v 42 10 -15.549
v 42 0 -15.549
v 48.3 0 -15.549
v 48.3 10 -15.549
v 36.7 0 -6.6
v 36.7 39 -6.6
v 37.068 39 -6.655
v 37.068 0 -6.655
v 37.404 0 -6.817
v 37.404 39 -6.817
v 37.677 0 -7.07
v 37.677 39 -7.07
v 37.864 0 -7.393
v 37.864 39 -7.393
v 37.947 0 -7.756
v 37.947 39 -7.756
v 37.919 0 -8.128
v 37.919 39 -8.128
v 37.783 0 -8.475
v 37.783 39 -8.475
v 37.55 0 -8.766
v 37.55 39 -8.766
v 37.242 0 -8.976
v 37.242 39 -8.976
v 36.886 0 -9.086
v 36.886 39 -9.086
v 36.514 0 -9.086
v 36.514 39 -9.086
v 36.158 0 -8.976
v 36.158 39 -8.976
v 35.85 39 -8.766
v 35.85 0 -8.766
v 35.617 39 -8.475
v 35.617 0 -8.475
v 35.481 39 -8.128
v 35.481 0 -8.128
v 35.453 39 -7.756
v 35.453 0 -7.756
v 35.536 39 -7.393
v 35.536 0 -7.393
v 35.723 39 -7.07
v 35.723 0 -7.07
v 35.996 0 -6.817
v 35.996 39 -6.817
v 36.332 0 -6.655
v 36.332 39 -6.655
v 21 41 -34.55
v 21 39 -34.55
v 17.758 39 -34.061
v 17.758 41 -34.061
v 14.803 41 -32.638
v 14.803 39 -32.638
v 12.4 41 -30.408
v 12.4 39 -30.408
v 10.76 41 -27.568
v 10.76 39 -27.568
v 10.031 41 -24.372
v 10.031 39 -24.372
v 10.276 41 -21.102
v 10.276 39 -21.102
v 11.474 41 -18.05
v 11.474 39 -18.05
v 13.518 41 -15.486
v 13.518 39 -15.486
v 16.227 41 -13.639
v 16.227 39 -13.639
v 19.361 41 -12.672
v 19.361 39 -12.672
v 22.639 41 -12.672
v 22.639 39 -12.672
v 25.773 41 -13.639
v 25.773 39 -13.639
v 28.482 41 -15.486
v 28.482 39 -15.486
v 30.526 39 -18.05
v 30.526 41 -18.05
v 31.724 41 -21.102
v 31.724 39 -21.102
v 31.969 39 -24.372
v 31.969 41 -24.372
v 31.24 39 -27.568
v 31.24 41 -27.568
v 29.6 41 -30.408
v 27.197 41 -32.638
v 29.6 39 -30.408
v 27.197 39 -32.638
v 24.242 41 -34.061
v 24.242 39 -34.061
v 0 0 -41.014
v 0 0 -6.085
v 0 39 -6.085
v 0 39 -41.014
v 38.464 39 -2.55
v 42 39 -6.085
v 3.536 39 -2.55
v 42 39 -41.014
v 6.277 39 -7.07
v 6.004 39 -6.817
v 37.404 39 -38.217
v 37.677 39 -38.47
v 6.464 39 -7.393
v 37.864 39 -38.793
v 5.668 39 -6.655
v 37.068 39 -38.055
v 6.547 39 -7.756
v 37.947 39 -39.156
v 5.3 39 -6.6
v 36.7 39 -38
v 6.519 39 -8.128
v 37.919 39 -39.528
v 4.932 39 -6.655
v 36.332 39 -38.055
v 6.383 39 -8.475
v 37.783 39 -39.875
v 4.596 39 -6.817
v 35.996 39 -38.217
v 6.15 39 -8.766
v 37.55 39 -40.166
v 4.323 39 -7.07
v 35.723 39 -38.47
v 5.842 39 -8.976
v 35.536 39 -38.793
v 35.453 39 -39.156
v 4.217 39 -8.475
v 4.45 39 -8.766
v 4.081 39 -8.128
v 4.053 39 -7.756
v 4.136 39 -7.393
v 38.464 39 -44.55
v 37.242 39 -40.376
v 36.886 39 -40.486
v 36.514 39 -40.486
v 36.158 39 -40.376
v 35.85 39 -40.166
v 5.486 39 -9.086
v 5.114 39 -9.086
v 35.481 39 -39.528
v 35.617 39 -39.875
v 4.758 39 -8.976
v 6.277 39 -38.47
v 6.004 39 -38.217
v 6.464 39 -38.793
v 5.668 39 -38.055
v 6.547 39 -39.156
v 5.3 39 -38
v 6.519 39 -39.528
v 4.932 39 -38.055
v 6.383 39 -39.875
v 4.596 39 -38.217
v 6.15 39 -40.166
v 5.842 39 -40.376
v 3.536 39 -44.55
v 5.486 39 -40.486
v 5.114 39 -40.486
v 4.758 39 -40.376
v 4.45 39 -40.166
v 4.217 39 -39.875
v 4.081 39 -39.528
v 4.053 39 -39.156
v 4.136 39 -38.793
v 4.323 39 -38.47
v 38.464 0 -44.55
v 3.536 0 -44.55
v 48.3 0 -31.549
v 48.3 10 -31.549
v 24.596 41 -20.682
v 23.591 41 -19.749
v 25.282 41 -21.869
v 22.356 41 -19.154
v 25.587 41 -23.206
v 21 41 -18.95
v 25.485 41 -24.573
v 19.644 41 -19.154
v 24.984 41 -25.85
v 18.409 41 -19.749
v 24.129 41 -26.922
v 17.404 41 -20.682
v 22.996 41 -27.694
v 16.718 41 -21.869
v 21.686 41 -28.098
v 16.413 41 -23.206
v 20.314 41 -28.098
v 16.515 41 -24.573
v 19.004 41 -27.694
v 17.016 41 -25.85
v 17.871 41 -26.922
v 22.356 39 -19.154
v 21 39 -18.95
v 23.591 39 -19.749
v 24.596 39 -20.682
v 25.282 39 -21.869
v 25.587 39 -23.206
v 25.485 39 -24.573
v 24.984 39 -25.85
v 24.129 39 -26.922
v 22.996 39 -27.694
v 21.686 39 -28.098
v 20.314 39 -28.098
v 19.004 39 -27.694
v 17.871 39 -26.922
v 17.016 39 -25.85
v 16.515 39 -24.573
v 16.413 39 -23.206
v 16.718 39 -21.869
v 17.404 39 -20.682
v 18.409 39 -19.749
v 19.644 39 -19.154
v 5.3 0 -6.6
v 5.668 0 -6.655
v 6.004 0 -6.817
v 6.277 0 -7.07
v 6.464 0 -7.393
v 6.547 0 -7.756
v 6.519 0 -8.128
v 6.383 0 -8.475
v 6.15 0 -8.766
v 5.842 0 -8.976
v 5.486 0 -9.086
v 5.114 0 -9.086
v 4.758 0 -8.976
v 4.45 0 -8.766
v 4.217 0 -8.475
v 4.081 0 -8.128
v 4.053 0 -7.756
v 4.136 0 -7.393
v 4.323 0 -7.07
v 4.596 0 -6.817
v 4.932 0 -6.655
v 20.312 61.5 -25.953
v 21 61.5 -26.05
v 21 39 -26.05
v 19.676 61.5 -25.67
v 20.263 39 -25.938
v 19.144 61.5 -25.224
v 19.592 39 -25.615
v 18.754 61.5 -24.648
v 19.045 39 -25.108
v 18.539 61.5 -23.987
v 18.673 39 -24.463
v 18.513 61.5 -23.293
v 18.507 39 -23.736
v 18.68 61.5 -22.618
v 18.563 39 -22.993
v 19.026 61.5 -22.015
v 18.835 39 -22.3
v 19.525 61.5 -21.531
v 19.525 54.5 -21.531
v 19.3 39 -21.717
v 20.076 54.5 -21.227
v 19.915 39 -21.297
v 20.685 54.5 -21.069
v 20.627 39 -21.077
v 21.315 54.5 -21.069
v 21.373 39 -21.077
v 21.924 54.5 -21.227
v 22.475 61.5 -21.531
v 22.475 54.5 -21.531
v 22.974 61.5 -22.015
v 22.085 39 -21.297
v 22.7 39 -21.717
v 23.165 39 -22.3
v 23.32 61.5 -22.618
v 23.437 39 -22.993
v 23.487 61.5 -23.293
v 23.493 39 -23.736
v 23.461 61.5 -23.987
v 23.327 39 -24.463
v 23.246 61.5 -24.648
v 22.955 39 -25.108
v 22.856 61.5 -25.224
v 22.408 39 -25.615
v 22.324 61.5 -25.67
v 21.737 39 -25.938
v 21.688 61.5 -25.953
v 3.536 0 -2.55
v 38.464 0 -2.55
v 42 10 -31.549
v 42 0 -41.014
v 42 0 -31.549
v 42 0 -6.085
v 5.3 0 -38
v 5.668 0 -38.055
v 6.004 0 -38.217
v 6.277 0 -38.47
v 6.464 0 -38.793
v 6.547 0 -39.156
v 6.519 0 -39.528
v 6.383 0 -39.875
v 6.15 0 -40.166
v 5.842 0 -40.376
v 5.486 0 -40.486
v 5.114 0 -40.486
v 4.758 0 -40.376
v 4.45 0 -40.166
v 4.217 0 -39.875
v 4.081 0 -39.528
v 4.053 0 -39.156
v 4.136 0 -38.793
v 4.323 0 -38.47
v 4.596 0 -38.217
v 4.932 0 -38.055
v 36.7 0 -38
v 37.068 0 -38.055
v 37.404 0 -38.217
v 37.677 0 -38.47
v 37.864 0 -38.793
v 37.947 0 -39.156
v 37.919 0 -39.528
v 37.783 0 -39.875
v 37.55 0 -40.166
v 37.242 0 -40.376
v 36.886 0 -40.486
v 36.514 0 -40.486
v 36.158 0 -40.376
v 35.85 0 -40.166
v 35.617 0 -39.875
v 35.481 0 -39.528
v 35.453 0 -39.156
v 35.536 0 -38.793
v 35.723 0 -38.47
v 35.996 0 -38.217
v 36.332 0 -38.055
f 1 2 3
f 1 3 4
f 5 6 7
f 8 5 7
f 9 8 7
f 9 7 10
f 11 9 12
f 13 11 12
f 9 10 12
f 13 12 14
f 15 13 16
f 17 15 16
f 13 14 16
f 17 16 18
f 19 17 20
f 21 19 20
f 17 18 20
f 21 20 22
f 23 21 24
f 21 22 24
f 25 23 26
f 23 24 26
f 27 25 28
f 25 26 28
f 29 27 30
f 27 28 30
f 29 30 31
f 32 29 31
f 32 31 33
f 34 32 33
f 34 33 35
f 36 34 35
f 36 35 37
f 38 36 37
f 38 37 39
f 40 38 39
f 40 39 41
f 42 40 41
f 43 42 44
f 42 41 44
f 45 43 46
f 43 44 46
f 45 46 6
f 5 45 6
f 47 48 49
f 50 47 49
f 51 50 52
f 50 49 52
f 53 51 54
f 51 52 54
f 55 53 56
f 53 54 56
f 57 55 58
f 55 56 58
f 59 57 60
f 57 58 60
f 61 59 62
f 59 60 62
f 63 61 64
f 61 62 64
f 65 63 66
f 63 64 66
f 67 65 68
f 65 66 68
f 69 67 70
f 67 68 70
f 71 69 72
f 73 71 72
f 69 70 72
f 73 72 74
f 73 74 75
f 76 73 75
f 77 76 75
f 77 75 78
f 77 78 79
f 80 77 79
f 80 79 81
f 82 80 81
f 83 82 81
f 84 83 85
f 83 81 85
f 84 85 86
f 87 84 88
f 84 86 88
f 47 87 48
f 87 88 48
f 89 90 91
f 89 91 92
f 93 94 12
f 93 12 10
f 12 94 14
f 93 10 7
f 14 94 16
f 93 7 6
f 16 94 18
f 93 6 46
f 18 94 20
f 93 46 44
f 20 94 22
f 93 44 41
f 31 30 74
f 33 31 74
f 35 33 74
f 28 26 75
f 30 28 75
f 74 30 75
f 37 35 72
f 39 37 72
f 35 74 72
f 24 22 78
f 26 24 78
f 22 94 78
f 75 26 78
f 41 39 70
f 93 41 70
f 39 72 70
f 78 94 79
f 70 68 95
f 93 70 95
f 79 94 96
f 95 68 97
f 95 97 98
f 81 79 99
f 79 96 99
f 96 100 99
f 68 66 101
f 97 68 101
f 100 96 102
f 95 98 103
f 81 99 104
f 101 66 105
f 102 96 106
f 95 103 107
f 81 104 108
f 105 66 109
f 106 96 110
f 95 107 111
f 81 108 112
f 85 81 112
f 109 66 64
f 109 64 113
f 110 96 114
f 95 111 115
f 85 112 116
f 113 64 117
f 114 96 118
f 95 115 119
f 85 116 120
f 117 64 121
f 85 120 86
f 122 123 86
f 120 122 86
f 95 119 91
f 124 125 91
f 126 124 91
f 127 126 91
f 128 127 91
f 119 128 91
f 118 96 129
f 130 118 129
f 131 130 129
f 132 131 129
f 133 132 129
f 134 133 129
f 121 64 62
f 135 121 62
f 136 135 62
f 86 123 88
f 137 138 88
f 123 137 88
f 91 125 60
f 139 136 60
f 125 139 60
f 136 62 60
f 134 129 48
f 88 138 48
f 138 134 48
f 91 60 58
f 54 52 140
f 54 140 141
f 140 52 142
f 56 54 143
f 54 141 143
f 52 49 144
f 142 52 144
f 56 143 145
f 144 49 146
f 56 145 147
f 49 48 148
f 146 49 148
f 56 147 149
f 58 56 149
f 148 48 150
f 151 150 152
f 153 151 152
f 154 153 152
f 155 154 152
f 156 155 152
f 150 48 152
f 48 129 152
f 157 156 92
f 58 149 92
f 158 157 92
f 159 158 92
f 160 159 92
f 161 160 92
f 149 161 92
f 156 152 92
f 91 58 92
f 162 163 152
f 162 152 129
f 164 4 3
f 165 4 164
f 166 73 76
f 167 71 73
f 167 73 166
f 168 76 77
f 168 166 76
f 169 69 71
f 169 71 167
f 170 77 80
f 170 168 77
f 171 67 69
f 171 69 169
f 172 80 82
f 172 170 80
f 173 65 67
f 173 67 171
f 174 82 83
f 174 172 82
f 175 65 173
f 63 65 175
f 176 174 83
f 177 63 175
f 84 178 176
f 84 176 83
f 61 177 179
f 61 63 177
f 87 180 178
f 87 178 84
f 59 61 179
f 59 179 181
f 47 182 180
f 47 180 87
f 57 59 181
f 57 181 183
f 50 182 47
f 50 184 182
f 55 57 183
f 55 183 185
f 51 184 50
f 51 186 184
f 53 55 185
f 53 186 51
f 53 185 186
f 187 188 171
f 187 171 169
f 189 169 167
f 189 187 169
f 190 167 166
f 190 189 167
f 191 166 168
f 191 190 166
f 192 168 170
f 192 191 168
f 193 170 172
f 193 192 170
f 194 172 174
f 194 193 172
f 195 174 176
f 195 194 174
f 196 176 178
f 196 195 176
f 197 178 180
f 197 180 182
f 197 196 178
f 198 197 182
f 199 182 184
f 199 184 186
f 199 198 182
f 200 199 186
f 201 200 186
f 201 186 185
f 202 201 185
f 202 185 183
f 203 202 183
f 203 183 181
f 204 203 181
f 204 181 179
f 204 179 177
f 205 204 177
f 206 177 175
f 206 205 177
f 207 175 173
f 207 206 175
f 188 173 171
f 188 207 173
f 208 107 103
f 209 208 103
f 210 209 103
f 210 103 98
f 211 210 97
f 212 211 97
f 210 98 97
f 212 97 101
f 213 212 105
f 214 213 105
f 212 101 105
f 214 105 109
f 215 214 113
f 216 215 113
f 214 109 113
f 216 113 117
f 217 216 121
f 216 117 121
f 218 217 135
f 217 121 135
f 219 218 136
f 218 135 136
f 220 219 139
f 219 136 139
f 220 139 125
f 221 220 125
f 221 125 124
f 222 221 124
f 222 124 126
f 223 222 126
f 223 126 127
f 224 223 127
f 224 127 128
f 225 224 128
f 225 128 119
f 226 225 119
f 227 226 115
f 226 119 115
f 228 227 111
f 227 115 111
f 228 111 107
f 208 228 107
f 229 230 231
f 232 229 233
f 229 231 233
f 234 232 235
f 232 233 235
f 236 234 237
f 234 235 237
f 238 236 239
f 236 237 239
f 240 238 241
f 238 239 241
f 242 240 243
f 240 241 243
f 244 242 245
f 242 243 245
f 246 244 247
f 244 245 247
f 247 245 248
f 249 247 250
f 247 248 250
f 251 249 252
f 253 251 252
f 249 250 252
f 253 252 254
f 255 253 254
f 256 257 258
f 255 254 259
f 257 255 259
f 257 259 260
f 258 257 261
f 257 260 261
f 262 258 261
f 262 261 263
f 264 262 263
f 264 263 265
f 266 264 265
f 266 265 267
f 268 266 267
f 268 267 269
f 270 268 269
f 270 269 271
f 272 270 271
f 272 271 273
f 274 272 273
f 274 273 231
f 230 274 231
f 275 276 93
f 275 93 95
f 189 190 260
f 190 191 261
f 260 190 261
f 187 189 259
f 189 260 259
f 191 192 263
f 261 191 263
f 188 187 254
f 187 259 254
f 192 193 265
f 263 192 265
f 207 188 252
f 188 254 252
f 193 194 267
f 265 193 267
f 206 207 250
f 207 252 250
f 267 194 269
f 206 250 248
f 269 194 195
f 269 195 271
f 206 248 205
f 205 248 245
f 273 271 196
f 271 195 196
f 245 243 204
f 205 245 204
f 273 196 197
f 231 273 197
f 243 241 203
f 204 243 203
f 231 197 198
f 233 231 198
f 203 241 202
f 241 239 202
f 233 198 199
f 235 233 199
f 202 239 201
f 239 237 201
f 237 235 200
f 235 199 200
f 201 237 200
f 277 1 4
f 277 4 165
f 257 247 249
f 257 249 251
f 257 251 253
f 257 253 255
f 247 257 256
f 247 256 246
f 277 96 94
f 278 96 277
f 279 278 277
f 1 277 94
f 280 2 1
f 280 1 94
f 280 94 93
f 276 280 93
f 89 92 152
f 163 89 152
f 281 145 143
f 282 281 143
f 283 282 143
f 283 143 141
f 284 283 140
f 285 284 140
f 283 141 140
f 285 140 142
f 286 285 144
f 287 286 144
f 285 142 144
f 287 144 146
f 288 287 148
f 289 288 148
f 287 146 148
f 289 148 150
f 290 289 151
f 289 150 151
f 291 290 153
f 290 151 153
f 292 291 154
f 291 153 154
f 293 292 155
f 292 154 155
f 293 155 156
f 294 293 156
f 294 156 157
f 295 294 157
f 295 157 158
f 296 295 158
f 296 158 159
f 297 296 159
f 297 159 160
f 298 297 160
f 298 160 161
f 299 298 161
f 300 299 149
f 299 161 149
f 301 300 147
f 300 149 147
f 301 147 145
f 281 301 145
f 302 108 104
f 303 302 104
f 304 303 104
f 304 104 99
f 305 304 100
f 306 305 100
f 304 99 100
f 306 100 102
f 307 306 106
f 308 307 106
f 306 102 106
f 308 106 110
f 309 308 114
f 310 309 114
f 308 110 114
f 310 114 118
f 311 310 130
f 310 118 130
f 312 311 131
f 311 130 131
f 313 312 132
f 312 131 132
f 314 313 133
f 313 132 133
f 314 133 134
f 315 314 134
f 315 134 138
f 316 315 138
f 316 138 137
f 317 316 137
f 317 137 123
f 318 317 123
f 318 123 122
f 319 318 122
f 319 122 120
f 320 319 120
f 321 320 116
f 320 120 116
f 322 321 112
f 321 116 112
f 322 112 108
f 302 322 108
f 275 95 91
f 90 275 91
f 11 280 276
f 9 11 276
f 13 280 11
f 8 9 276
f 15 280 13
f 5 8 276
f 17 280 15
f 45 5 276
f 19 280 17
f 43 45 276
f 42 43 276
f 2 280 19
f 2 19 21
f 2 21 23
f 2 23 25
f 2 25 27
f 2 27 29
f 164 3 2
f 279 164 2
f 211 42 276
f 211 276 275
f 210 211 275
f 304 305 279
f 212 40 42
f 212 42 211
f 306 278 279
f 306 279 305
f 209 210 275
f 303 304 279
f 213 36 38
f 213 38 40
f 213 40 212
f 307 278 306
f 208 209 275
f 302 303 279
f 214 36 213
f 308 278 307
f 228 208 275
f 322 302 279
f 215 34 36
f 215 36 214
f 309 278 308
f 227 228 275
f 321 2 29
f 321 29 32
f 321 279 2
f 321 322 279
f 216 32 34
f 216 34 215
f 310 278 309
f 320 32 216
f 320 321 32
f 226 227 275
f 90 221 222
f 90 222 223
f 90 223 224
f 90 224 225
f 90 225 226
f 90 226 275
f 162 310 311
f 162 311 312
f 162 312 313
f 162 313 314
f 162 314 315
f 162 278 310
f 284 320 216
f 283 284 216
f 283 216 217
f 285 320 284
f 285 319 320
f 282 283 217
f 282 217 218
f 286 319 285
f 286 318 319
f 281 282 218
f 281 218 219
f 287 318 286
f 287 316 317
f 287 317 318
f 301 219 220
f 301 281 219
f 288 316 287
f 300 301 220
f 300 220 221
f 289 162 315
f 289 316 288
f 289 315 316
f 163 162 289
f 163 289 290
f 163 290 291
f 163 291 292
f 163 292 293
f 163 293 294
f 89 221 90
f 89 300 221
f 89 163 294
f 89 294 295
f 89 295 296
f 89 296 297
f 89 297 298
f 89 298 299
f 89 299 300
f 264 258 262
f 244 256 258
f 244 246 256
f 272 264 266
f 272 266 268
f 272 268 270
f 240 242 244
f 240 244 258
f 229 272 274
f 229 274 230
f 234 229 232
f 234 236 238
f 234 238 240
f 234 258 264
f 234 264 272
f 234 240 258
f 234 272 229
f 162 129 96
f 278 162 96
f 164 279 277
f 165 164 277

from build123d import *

# Parameters (mm, degrees)
BOSS_EXTRU_1_DEPTH      = 39
ESQUISSE2_R             = 1.25
ENL_V_MAT_EXTRU_1_DEPTH = 39
ESQUISSE3_R             = 11
ESQUISSE3_R_2           = 4.6
BOSS_EXTRU_2_DEPTH      = 2
ESQUISSE4_R             = 2.5
BOSS_EXTRU_3_DEPTH      = 22.5
ENL_V_START             = -7
ENL_V_MAT_EXTRU_4_DEPTH = 7
ESQUISSE9_W             = 16
ESQUISSE9_H             = 10
BOSS_EXTRU_4_DEPTH      = 6.3


with BuildPart() as part:
    # Esquisse1 → Boss.-Extru.1 (new body)
    with BuildSketch(Plane(origin=(0, 0, 0), x_dir=(1, 0, 0), z_dir=(0, 1, 0))):
        Polygon((3.535533906, 2.549558154), (0, 6.08509206), (0, 41.014024248), (3.535533906, 44.549558154), (38.464466094, 44.549558154), (42, 41.014024248), (42, 6.08509206), (38.464466094, 2.549558154), align=None)
    extrude(amount=BOSS_EXTRU_1_DEPTH)

    # Esquisse2 → Enlèv. mat.-Extru.1 (cut)
    with BuildSketch(Plane(origin=(0, 39, 0), x_dir=(1, 0, 0), z_dir=(0, 1, 0))):
        with Locations(Location((5.3, 39.249558154, 0), (0, 0, 270))):
            Circle(ESQUISSE2_R)
        with Locations(Location((36.7, 39.249558154, 0), (0, 0, 270))):
            Circle(ESQUISSE2_R)
        with Locations(Location((36.7, 7.849558154, 0), (0, 0, 270))):
            Circle(ESQUISSE2_R)
        with Locations(Location((5.3, 7.849558154, 0), (0, 0, 270))):
            Circle(ESQUISSE2_R)
    extrude(amount=-ENL_V_MAT_EXTRU_1_DEPTH, mode=Mode.SUBTRACT)

    # Esquisse3 → Boss.-Extru.2 (add)
    with BuildSketch(Plane(origin=(0, 39, 0), x_dir=(1, 0, 0), z_dir=(0, 1, 0))):
        with Locations(Location((21, 23.549558154, 0), (0, 0, 90))):
            Circle(ESQUISSE3_R)
        with Locations(Location((21, 23.549558154, 0), (0, 0, 270))):
            Circle(ESQUISSE3_R_2, mode=Mode.SUBTRACT)
    extrude(amount=BOSS_EXTRU_2_DEPTH)

    # Esquisse4 → Boss.-Extru.3 (add)
    with BuildSketch(Plane(origin=(0, 39, 0), x_dir=(1, 0, 0), z_dir=(0, 1, 0))):
        with Locations(Location((21, 23.549558154, 0), (0, 0, 90))):
            Circle(ESQUISSE4_R)
    extrude(amount=BOSS_EXTRU_3_DEPTH)

    # Esquisse8 → Enlèv. mat.-Extru.4 (cut)
    with BuildSketch(Plane(origin=(0, 61.5, 0), x_dir=(1, 0, 0), z_dir=(0, 1, 0)).offset(ENL_V_START)):
        with BuildLine():
            Line((22.47490916, 21.530983664), (19.52509084, 21.530983664))
            ThreePointArc((19.52509084, 21.530983664), (21, 21.049558154), (22.47490916, 21.530983664))
        make_face()
    extrude(amount=ENL_V_MAT_EXTRU_4_DEPTH, mode=Mode.SUBTRACT)

    # Esquisse9 → Boss.-Extru.4 (add)
    with BuildSketch(Plane(origin=(42, 0, 0), x_dir=(0, 0, -1), z_dir=(1, 0, 0))):
        with Locations((23.549024248, 5)):
            Rectangle(ESQUISSE9_W, ESQUISSE9_H)
    extrude(amount=BOSS_EXTRU_4_DEPTH)


solid = part.part
